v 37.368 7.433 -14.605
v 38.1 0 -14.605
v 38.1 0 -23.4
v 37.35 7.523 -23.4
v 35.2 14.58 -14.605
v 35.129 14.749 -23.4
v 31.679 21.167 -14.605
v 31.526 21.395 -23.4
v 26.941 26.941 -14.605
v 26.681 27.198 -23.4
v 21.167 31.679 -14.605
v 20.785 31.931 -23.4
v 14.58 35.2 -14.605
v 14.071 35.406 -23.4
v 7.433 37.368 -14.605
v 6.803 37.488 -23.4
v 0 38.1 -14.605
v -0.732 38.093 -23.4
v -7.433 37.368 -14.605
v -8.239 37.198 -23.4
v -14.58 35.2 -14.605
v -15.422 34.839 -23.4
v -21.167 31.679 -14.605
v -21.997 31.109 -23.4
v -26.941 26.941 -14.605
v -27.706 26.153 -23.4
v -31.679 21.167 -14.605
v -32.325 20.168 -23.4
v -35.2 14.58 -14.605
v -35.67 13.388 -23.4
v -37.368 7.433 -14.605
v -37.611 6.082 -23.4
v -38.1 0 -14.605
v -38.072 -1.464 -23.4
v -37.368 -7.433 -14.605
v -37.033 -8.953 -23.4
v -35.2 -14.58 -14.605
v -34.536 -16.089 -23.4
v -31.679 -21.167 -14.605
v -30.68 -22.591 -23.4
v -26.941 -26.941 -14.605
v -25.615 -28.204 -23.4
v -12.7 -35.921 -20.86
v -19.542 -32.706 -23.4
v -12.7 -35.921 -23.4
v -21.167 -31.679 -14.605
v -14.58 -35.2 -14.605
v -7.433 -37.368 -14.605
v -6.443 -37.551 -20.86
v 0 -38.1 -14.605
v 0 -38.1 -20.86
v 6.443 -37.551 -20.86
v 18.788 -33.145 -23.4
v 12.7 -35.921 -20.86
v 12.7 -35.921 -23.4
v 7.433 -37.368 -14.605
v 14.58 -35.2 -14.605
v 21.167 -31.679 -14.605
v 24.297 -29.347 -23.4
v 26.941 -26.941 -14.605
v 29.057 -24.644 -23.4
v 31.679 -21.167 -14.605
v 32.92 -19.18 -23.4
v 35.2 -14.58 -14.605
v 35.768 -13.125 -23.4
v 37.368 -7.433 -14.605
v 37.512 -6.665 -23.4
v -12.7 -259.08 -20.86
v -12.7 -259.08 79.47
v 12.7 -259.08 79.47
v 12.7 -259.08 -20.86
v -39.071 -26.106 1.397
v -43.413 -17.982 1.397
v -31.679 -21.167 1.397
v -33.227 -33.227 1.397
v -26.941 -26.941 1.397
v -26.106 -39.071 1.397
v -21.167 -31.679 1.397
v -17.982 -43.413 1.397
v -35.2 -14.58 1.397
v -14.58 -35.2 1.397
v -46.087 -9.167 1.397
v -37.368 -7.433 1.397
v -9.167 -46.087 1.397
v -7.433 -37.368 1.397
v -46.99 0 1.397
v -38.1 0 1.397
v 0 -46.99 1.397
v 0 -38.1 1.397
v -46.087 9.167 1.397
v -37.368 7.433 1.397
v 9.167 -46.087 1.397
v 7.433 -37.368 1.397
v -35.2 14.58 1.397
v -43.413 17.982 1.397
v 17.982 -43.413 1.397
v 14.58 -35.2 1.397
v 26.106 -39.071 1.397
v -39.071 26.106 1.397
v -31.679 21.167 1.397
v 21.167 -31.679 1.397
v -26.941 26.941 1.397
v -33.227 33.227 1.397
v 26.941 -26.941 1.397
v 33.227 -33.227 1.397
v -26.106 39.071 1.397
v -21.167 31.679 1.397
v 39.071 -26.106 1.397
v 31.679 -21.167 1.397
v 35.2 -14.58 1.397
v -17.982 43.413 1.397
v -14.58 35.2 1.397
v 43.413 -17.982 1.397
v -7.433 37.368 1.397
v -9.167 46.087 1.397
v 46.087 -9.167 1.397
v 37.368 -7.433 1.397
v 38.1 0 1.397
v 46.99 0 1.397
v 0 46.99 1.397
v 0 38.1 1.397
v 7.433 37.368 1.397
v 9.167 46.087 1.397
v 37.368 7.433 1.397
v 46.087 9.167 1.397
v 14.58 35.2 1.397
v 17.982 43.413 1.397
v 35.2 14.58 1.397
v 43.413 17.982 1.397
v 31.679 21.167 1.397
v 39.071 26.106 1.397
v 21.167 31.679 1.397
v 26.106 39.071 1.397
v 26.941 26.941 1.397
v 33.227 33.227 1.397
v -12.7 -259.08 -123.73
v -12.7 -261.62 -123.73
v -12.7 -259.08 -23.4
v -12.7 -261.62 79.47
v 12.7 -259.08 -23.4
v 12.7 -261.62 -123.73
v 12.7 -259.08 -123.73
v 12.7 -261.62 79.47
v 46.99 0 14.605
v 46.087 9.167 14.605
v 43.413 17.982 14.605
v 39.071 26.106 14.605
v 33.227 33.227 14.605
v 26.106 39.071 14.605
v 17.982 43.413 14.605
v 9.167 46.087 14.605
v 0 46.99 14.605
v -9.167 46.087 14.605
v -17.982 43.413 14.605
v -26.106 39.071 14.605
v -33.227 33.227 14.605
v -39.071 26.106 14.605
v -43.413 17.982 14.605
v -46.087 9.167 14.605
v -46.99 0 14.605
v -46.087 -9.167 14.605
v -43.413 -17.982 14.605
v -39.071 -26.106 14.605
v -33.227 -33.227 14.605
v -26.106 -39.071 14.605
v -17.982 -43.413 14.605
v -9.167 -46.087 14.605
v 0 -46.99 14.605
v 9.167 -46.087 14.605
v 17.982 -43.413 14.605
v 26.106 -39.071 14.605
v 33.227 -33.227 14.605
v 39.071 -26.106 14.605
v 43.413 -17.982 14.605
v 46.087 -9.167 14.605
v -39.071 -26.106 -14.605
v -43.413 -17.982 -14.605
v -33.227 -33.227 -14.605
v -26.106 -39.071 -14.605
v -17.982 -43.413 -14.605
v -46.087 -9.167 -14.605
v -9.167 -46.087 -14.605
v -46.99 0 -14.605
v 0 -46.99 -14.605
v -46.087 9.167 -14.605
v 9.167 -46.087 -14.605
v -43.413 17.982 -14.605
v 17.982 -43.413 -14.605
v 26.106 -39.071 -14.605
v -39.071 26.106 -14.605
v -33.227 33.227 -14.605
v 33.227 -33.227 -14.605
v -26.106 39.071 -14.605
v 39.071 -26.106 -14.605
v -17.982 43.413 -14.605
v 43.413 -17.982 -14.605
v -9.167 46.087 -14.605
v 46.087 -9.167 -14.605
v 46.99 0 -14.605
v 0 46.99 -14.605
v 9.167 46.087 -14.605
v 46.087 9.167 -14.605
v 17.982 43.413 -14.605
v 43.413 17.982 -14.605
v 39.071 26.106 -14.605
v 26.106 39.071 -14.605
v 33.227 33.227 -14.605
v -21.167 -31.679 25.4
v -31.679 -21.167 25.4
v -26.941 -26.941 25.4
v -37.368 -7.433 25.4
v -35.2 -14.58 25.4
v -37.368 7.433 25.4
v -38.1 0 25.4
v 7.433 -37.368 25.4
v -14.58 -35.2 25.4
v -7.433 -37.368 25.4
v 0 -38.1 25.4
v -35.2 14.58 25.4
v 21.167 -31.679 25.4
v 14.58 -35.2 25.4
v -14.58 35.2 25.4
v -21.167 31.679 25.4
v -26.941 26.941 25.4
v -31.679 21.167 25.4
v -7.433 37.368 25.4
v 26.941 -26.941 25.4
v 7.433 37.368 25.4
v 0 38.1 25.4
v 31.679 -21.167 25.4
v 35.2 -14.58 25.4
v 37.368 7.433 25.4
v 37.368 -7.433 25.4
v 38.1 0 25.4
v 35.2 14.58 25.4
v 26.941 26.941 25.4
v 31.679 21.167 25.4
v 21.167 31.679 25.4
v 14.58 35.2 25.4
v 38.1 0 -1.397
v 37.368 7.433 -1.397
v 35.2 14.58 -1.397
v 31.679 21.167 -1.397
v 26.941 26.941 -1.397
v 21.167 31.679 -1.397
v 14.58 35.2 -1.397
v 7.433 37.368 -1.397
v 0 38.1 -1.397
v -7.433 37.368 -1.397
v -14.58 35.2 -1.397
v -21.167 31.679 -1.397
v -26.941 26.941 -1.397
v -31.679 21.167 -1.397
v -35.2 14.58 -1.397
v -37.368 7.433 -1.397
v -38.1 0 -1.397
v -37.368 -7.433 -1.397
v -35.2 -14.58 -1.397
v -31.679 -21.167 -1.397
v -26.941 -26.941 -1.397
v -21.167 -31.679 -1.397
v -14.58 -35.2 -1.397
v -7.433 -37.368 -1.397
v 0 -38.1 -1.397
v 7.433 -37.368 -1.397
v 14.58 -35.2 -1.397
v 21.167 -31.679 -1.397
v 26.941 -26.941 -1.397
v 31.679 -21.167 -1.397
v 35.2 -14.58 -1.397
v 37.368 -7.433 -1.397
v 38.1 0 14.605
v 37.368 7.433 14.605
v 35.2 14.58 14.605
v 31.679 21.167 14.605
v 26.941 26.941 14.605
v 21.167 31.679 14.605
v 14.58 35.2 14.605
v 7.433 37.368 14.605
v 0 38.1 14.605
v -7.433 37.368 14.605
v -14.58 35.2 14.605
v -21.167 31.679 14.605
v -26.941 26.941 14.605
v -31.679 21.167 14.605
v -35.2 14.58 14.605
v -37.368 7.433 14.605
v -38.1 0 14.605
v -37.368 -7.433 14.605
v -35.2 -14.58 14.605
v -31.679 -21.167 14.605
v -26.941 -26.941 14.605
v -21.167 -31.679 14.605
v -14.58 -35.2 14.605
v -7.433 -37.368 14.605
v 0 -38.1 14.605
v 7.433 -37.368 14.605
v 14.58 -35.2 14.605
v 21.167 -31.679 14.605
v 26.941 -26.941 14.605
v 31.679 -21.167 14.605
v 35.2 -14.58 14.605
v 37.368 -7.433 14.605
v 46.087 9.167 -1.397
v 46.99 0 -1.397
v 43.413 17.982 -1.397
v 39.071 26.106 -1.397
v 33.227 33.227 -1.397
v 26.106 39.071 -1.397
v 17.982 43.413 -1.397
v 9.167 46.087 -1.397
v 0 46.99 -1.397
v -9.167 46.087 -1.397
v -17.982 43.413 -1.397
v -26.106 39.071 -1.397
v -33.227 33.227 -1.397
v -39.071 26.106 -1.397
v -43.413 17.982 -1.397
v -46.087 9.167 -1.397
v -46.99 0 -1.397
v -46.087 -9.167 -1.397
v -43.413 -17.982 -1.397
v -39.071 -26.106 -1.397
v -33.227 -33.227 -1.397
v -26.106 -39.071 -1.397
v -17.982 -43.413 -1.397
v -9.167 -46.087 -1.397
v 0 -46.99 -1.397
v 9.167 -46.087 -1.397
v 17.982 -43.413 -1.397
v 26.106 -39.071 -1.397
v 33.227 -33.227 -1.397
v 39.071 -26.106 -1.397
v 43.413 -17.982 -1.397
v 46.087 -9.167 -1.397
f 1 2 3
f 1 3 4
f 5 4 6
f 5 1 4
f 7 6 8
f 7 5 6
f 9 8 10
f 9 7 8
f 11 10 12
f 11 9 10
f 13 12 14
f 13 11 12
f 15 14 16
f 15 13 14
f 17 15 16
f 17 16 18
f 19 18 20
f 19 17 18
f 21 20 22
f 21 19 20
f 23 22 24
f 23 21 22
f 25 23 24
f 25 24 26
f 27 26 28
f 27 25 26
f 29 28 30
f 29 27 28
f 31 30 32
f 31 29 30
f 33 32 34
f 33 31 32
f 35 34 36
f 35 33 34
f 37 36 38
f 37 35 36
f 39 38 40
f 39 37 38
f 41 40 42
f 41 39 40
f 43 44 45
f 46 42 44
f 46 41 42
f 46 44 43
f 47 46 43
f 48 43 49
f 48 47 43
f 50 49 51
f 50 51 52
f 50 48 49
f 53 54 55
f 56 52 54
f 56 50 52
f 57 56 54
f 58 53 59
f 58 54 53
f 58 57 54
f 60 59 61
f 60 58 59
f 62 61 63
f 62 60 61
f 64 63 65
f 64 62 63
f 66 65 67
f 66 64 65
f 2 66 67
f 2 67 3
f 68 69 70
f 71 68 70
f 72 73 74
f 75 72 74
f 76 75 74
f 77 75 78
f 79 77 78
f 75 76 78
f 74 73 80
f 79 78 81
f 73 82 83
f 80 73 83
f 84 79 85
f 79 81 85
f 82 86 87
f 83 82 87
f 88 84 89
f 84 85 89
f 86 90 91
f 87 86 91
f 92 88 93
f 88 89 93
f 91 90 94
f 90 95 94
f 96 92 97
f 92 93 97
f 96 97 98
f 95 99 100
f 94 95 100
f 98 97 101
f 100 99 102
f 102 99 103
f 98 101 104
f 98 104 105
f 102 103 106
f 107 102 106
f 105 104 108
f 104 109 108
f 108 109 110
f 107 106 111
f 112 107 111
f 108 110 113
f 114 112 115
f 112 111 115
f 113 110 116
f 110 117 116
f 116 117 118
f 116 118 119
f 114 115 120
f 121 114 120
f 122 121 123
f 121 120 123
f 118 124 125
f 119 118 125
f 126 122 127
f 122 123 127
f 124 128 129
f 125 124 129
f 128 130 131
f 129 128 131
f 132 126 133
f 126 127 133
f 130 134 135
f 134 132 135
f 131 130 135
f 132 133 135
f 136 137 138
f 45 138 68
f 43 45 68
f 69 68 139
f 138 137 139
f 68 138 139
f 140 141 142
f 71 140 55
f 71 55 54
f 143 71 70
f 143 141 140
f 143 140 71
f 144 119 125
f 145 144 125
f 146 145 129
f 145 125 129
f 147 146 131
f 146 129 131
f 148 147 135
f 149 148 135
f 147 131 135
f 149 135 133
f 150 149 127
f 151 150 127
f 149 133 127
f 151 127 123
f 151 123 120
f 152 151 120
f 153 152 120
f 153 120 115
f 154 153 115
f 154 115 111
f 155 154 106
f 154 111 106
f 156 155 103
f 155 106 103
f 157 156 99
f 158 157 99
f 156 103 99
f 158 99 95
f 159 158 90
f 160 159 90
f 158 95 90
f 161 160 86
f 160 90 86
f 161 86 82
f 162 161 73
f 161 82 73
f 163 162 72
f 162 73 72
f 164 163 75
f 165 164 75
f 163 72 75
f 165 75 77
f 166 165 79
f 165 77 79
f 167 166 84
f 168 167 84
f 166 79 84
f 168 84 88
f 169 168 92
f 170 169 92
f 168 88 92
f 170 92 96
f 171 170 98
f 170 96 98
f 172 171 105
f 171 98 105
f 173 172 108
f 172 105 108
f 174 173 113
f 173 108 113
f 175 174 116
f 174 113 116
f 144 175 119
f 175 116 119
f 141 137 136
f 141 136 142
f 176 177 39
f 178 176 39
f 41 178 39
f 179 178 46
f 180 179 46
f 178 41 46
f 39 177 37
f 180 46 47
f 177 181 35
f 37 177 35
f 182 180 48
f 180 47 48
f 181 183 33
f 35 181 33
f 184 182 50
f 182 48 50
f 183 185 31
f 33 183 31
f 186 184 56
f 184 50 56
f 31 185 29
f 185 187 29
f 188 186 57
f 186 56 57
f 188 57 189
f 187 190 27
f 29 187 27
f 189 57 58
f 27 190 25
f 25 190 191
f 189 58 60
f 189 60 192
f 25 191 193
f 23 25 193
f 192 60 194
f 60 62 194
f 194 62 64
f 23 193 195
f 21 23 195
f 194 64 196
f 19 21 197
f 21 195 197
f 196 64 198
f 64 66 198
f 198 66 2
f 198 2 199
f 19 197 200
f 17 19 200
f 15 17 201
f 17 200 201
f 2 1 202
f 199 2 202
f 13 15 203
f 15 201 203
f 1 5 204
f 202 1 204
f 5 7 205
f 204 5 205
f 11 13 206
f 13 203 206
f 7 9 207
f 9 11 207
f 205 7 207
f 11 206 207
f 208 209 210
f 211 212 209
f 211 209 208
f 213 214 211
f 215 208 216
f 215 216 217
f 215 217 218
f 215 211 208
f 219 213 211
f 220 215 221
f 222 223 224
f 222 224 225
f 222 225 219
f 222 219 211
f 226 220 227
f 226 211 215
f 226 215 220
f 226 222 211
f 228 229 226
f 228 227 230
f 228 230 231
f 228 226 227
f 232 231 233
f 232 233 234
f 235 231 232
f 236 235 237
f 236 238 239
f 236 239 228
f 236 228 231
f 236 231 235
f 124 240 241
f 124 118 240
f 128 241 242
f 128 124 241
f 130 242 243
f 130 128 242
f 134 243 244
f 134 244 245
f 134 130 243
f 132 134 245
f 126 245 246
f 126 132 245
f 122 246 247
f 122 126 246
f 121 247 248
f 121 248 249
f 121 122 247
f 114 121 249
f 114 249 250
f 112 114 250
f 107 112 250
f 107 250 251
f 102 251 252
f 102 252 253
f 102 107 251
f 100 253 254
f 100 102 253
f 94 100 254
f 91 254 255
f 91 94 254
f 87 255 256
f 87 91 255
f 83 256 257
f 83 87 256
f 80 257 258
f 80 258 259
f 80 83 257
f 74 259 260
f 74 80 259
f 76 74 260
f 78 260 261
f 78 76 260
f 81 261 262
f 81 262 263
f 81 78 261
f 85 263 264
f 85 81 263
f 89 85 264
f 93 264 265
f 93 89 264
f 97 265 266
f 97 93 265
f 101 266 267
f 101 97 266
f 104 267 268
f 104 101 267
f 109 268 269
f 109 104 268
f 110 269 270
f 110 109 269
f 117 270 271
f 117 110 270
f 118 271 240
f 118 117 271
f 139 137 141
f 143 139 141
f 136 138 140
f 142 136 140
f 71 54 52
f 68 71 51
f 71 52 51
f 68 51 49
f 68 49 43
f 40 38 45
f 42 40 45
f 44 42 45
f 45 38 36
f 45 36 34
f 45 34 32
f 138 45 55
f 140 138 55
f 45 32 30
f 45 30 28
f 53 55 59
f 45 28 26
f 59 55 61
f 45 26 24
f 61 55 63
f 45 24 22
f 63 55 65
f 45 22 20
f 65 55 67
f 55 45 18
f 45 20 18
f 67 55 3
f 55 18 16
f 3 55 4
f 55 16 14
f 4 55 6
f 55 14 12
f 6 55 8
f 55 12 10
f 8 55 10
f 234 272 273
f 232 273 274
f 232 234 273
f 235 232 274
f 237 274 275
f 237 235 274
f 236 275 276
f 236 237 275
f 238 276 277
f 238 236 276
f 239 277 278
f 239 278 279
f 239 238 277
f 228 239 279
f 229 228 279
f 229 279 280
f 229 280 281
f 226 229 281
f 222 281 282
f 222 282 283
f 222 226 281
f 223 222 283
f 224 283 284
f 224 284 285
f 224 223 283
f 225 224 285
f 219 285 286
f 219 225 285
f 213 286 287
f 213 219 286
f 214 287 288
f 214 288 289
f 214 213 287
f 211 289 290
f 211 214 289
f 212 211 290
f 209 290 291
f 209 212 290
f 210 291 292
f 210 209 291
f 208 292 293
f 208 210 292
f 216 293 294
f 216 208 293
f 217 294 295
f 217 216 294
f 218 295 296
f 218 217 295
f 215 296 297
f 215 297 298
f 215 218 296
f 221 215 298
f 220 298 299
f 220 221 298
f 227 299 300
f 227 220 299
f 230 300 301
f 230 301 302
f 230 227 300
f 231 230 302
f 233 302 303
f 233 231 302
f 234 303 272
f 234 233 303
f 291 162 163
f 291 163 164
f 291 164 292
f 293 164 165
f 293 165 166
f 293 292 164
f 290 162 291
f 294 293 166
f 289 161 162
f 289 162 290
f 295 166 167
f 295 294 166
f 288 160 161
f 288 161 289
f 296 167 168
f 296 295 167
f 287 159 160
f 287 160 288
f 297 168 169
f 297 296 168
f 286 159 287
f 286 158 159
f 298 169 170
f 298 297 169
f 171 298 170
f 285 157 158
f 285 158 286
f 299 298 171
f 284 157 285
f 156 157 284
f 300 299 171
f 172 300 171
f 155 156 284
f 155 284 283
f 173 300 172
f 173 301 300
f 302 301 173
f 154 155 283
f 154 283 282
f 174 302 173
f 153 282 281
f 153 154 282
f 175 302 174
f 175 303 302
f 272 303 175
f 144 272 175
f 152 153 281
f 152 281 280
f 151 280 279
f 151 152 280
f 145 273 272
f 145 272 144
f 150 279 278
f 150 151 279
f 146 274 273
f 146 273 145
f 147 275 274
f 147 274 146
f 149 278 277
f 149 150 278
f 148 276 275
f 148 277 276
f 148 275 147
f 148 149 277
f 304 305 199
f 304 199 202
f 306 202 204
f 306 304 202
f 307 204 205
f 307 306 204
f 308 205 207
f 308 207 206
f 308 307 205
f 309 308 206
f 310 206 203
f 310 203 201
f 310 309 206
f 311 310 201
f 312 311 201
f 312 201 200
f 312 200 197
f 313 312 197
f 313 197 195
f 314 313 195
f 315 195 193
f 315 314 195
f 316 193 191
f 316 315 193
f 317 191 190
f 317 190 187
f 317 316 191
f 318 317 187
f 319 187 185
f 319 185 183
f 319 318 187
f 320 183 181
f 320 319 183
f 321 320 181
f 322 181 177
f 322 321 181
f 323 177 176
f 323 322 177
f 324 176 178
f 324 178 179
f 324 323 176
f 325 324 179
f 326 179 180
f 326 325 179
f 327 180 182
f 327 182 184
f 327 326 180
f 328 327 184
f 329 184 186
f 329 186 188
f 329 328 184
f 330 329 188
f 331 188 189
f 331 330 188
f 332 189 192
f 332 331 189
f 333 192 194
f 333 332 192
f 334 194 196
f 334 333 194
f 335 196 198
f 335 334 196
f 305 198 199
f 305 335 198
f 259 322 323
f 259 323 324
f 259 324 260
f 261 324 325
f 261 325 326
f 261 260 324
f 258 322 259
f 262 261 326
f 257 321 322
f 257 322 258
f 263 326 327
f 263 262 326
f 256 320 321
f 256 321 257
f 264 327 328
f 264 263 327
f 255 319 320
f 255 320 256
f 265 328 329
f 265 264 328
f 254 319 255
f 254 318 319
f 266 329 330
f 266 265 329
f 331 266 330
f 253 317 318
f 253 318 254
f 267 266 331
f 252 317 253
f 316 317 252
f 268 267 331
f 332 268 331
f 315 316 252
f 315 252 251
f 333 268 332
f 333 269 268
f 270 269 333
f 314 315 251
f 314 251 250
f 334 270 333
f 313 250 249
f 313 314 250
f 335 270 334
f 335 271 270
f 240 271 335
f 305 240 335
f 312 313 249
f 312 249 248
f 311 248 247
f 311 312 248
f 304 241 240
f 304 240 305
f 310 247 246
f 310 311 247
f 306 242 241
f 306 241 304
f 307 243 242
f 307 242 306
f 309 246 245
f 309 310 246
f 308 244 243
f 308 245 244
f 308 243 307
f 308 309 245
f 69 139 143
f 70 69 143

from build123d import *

# Parameters (mm, degrees)
SKETCH1_R                = 38.1
HUB_CENTER_DEPTH         = 25.4
HUB_CENTER_DEPTH_BACK    = 23.4
INNER_START              = 1.397
SKETCH2_R                = 46.99
INNER_BEARING_DEPTH      = 13.208
OUTER_START              = -1.397
SKETCH3_R                = 46.99
OUTER_BEARING_DEPTH      = 13.208
TIRE_ARM_DEPTH           = 2.54
SKETCH5_W                = 25.4
SKETCH5_H                = 203.2
TIRE_CONTACT_PATCH_DEPTH = 2.54


with BuildPart() as part:
    # Sketch1 → Hub Center (new body, two sides)
    with BuildSketch(Plane.XY) as hub_center_sk:
        Circle(SKETCH1_R)
    extrude(amount=HUB_CENTER_DEPTH)
    extrude(hub_center_sk.sketch, amount=-HUB_CENTER_DEPTH_BACK)

    # Sketch2 → Inner Bearing (add)
    with BuildSketch(Plane.XY.offset(INNER_START)):
        Circle(SKETCH2_R)
    extrude(amount=INNER_BEARING_DEPTH)

    # Sketch3 → Outer Bearing (add)
    with BuildSketch(Plane.XY.offset(OUTER_START)):
        Circle(SKETCH3_R)
    extrude(amount=-OUTER_BEARING_DEPTH)

    # Sketch4 → Tire Arm (add)
    with BuildSketch(Plane(origin=(0, 0, -23.4), x_dir=(-1, 0, 0), z_dir=(0, 0, -1))):
        with BuildLine():
            Line((-12.7, -35.921024484), (-12.7, -261.62))
            Line((-12.7, -261.62), (12.7, -261.62))
            Line((12.7, -261.62), (12.7, -35.921024484))
            ThreePointArc((12.7, -35.921024484), (0, -38.1), (-12.7, -35.921024484))
        make_face()
    extrude(amount=-TIRE_ARM_DEPTH)

    # Sketch5 → Tire Contact Patch (add)
    with BuildSketch(Plane.XZ.offset(261.62)):
        with Locations((0, -22.13)):
            Rectangle(SKETCH5_W, SKETCH5_H)
    extrude(amount=-TIRE_CONTACT_PATCH_DEPTH)


solid = part.part
